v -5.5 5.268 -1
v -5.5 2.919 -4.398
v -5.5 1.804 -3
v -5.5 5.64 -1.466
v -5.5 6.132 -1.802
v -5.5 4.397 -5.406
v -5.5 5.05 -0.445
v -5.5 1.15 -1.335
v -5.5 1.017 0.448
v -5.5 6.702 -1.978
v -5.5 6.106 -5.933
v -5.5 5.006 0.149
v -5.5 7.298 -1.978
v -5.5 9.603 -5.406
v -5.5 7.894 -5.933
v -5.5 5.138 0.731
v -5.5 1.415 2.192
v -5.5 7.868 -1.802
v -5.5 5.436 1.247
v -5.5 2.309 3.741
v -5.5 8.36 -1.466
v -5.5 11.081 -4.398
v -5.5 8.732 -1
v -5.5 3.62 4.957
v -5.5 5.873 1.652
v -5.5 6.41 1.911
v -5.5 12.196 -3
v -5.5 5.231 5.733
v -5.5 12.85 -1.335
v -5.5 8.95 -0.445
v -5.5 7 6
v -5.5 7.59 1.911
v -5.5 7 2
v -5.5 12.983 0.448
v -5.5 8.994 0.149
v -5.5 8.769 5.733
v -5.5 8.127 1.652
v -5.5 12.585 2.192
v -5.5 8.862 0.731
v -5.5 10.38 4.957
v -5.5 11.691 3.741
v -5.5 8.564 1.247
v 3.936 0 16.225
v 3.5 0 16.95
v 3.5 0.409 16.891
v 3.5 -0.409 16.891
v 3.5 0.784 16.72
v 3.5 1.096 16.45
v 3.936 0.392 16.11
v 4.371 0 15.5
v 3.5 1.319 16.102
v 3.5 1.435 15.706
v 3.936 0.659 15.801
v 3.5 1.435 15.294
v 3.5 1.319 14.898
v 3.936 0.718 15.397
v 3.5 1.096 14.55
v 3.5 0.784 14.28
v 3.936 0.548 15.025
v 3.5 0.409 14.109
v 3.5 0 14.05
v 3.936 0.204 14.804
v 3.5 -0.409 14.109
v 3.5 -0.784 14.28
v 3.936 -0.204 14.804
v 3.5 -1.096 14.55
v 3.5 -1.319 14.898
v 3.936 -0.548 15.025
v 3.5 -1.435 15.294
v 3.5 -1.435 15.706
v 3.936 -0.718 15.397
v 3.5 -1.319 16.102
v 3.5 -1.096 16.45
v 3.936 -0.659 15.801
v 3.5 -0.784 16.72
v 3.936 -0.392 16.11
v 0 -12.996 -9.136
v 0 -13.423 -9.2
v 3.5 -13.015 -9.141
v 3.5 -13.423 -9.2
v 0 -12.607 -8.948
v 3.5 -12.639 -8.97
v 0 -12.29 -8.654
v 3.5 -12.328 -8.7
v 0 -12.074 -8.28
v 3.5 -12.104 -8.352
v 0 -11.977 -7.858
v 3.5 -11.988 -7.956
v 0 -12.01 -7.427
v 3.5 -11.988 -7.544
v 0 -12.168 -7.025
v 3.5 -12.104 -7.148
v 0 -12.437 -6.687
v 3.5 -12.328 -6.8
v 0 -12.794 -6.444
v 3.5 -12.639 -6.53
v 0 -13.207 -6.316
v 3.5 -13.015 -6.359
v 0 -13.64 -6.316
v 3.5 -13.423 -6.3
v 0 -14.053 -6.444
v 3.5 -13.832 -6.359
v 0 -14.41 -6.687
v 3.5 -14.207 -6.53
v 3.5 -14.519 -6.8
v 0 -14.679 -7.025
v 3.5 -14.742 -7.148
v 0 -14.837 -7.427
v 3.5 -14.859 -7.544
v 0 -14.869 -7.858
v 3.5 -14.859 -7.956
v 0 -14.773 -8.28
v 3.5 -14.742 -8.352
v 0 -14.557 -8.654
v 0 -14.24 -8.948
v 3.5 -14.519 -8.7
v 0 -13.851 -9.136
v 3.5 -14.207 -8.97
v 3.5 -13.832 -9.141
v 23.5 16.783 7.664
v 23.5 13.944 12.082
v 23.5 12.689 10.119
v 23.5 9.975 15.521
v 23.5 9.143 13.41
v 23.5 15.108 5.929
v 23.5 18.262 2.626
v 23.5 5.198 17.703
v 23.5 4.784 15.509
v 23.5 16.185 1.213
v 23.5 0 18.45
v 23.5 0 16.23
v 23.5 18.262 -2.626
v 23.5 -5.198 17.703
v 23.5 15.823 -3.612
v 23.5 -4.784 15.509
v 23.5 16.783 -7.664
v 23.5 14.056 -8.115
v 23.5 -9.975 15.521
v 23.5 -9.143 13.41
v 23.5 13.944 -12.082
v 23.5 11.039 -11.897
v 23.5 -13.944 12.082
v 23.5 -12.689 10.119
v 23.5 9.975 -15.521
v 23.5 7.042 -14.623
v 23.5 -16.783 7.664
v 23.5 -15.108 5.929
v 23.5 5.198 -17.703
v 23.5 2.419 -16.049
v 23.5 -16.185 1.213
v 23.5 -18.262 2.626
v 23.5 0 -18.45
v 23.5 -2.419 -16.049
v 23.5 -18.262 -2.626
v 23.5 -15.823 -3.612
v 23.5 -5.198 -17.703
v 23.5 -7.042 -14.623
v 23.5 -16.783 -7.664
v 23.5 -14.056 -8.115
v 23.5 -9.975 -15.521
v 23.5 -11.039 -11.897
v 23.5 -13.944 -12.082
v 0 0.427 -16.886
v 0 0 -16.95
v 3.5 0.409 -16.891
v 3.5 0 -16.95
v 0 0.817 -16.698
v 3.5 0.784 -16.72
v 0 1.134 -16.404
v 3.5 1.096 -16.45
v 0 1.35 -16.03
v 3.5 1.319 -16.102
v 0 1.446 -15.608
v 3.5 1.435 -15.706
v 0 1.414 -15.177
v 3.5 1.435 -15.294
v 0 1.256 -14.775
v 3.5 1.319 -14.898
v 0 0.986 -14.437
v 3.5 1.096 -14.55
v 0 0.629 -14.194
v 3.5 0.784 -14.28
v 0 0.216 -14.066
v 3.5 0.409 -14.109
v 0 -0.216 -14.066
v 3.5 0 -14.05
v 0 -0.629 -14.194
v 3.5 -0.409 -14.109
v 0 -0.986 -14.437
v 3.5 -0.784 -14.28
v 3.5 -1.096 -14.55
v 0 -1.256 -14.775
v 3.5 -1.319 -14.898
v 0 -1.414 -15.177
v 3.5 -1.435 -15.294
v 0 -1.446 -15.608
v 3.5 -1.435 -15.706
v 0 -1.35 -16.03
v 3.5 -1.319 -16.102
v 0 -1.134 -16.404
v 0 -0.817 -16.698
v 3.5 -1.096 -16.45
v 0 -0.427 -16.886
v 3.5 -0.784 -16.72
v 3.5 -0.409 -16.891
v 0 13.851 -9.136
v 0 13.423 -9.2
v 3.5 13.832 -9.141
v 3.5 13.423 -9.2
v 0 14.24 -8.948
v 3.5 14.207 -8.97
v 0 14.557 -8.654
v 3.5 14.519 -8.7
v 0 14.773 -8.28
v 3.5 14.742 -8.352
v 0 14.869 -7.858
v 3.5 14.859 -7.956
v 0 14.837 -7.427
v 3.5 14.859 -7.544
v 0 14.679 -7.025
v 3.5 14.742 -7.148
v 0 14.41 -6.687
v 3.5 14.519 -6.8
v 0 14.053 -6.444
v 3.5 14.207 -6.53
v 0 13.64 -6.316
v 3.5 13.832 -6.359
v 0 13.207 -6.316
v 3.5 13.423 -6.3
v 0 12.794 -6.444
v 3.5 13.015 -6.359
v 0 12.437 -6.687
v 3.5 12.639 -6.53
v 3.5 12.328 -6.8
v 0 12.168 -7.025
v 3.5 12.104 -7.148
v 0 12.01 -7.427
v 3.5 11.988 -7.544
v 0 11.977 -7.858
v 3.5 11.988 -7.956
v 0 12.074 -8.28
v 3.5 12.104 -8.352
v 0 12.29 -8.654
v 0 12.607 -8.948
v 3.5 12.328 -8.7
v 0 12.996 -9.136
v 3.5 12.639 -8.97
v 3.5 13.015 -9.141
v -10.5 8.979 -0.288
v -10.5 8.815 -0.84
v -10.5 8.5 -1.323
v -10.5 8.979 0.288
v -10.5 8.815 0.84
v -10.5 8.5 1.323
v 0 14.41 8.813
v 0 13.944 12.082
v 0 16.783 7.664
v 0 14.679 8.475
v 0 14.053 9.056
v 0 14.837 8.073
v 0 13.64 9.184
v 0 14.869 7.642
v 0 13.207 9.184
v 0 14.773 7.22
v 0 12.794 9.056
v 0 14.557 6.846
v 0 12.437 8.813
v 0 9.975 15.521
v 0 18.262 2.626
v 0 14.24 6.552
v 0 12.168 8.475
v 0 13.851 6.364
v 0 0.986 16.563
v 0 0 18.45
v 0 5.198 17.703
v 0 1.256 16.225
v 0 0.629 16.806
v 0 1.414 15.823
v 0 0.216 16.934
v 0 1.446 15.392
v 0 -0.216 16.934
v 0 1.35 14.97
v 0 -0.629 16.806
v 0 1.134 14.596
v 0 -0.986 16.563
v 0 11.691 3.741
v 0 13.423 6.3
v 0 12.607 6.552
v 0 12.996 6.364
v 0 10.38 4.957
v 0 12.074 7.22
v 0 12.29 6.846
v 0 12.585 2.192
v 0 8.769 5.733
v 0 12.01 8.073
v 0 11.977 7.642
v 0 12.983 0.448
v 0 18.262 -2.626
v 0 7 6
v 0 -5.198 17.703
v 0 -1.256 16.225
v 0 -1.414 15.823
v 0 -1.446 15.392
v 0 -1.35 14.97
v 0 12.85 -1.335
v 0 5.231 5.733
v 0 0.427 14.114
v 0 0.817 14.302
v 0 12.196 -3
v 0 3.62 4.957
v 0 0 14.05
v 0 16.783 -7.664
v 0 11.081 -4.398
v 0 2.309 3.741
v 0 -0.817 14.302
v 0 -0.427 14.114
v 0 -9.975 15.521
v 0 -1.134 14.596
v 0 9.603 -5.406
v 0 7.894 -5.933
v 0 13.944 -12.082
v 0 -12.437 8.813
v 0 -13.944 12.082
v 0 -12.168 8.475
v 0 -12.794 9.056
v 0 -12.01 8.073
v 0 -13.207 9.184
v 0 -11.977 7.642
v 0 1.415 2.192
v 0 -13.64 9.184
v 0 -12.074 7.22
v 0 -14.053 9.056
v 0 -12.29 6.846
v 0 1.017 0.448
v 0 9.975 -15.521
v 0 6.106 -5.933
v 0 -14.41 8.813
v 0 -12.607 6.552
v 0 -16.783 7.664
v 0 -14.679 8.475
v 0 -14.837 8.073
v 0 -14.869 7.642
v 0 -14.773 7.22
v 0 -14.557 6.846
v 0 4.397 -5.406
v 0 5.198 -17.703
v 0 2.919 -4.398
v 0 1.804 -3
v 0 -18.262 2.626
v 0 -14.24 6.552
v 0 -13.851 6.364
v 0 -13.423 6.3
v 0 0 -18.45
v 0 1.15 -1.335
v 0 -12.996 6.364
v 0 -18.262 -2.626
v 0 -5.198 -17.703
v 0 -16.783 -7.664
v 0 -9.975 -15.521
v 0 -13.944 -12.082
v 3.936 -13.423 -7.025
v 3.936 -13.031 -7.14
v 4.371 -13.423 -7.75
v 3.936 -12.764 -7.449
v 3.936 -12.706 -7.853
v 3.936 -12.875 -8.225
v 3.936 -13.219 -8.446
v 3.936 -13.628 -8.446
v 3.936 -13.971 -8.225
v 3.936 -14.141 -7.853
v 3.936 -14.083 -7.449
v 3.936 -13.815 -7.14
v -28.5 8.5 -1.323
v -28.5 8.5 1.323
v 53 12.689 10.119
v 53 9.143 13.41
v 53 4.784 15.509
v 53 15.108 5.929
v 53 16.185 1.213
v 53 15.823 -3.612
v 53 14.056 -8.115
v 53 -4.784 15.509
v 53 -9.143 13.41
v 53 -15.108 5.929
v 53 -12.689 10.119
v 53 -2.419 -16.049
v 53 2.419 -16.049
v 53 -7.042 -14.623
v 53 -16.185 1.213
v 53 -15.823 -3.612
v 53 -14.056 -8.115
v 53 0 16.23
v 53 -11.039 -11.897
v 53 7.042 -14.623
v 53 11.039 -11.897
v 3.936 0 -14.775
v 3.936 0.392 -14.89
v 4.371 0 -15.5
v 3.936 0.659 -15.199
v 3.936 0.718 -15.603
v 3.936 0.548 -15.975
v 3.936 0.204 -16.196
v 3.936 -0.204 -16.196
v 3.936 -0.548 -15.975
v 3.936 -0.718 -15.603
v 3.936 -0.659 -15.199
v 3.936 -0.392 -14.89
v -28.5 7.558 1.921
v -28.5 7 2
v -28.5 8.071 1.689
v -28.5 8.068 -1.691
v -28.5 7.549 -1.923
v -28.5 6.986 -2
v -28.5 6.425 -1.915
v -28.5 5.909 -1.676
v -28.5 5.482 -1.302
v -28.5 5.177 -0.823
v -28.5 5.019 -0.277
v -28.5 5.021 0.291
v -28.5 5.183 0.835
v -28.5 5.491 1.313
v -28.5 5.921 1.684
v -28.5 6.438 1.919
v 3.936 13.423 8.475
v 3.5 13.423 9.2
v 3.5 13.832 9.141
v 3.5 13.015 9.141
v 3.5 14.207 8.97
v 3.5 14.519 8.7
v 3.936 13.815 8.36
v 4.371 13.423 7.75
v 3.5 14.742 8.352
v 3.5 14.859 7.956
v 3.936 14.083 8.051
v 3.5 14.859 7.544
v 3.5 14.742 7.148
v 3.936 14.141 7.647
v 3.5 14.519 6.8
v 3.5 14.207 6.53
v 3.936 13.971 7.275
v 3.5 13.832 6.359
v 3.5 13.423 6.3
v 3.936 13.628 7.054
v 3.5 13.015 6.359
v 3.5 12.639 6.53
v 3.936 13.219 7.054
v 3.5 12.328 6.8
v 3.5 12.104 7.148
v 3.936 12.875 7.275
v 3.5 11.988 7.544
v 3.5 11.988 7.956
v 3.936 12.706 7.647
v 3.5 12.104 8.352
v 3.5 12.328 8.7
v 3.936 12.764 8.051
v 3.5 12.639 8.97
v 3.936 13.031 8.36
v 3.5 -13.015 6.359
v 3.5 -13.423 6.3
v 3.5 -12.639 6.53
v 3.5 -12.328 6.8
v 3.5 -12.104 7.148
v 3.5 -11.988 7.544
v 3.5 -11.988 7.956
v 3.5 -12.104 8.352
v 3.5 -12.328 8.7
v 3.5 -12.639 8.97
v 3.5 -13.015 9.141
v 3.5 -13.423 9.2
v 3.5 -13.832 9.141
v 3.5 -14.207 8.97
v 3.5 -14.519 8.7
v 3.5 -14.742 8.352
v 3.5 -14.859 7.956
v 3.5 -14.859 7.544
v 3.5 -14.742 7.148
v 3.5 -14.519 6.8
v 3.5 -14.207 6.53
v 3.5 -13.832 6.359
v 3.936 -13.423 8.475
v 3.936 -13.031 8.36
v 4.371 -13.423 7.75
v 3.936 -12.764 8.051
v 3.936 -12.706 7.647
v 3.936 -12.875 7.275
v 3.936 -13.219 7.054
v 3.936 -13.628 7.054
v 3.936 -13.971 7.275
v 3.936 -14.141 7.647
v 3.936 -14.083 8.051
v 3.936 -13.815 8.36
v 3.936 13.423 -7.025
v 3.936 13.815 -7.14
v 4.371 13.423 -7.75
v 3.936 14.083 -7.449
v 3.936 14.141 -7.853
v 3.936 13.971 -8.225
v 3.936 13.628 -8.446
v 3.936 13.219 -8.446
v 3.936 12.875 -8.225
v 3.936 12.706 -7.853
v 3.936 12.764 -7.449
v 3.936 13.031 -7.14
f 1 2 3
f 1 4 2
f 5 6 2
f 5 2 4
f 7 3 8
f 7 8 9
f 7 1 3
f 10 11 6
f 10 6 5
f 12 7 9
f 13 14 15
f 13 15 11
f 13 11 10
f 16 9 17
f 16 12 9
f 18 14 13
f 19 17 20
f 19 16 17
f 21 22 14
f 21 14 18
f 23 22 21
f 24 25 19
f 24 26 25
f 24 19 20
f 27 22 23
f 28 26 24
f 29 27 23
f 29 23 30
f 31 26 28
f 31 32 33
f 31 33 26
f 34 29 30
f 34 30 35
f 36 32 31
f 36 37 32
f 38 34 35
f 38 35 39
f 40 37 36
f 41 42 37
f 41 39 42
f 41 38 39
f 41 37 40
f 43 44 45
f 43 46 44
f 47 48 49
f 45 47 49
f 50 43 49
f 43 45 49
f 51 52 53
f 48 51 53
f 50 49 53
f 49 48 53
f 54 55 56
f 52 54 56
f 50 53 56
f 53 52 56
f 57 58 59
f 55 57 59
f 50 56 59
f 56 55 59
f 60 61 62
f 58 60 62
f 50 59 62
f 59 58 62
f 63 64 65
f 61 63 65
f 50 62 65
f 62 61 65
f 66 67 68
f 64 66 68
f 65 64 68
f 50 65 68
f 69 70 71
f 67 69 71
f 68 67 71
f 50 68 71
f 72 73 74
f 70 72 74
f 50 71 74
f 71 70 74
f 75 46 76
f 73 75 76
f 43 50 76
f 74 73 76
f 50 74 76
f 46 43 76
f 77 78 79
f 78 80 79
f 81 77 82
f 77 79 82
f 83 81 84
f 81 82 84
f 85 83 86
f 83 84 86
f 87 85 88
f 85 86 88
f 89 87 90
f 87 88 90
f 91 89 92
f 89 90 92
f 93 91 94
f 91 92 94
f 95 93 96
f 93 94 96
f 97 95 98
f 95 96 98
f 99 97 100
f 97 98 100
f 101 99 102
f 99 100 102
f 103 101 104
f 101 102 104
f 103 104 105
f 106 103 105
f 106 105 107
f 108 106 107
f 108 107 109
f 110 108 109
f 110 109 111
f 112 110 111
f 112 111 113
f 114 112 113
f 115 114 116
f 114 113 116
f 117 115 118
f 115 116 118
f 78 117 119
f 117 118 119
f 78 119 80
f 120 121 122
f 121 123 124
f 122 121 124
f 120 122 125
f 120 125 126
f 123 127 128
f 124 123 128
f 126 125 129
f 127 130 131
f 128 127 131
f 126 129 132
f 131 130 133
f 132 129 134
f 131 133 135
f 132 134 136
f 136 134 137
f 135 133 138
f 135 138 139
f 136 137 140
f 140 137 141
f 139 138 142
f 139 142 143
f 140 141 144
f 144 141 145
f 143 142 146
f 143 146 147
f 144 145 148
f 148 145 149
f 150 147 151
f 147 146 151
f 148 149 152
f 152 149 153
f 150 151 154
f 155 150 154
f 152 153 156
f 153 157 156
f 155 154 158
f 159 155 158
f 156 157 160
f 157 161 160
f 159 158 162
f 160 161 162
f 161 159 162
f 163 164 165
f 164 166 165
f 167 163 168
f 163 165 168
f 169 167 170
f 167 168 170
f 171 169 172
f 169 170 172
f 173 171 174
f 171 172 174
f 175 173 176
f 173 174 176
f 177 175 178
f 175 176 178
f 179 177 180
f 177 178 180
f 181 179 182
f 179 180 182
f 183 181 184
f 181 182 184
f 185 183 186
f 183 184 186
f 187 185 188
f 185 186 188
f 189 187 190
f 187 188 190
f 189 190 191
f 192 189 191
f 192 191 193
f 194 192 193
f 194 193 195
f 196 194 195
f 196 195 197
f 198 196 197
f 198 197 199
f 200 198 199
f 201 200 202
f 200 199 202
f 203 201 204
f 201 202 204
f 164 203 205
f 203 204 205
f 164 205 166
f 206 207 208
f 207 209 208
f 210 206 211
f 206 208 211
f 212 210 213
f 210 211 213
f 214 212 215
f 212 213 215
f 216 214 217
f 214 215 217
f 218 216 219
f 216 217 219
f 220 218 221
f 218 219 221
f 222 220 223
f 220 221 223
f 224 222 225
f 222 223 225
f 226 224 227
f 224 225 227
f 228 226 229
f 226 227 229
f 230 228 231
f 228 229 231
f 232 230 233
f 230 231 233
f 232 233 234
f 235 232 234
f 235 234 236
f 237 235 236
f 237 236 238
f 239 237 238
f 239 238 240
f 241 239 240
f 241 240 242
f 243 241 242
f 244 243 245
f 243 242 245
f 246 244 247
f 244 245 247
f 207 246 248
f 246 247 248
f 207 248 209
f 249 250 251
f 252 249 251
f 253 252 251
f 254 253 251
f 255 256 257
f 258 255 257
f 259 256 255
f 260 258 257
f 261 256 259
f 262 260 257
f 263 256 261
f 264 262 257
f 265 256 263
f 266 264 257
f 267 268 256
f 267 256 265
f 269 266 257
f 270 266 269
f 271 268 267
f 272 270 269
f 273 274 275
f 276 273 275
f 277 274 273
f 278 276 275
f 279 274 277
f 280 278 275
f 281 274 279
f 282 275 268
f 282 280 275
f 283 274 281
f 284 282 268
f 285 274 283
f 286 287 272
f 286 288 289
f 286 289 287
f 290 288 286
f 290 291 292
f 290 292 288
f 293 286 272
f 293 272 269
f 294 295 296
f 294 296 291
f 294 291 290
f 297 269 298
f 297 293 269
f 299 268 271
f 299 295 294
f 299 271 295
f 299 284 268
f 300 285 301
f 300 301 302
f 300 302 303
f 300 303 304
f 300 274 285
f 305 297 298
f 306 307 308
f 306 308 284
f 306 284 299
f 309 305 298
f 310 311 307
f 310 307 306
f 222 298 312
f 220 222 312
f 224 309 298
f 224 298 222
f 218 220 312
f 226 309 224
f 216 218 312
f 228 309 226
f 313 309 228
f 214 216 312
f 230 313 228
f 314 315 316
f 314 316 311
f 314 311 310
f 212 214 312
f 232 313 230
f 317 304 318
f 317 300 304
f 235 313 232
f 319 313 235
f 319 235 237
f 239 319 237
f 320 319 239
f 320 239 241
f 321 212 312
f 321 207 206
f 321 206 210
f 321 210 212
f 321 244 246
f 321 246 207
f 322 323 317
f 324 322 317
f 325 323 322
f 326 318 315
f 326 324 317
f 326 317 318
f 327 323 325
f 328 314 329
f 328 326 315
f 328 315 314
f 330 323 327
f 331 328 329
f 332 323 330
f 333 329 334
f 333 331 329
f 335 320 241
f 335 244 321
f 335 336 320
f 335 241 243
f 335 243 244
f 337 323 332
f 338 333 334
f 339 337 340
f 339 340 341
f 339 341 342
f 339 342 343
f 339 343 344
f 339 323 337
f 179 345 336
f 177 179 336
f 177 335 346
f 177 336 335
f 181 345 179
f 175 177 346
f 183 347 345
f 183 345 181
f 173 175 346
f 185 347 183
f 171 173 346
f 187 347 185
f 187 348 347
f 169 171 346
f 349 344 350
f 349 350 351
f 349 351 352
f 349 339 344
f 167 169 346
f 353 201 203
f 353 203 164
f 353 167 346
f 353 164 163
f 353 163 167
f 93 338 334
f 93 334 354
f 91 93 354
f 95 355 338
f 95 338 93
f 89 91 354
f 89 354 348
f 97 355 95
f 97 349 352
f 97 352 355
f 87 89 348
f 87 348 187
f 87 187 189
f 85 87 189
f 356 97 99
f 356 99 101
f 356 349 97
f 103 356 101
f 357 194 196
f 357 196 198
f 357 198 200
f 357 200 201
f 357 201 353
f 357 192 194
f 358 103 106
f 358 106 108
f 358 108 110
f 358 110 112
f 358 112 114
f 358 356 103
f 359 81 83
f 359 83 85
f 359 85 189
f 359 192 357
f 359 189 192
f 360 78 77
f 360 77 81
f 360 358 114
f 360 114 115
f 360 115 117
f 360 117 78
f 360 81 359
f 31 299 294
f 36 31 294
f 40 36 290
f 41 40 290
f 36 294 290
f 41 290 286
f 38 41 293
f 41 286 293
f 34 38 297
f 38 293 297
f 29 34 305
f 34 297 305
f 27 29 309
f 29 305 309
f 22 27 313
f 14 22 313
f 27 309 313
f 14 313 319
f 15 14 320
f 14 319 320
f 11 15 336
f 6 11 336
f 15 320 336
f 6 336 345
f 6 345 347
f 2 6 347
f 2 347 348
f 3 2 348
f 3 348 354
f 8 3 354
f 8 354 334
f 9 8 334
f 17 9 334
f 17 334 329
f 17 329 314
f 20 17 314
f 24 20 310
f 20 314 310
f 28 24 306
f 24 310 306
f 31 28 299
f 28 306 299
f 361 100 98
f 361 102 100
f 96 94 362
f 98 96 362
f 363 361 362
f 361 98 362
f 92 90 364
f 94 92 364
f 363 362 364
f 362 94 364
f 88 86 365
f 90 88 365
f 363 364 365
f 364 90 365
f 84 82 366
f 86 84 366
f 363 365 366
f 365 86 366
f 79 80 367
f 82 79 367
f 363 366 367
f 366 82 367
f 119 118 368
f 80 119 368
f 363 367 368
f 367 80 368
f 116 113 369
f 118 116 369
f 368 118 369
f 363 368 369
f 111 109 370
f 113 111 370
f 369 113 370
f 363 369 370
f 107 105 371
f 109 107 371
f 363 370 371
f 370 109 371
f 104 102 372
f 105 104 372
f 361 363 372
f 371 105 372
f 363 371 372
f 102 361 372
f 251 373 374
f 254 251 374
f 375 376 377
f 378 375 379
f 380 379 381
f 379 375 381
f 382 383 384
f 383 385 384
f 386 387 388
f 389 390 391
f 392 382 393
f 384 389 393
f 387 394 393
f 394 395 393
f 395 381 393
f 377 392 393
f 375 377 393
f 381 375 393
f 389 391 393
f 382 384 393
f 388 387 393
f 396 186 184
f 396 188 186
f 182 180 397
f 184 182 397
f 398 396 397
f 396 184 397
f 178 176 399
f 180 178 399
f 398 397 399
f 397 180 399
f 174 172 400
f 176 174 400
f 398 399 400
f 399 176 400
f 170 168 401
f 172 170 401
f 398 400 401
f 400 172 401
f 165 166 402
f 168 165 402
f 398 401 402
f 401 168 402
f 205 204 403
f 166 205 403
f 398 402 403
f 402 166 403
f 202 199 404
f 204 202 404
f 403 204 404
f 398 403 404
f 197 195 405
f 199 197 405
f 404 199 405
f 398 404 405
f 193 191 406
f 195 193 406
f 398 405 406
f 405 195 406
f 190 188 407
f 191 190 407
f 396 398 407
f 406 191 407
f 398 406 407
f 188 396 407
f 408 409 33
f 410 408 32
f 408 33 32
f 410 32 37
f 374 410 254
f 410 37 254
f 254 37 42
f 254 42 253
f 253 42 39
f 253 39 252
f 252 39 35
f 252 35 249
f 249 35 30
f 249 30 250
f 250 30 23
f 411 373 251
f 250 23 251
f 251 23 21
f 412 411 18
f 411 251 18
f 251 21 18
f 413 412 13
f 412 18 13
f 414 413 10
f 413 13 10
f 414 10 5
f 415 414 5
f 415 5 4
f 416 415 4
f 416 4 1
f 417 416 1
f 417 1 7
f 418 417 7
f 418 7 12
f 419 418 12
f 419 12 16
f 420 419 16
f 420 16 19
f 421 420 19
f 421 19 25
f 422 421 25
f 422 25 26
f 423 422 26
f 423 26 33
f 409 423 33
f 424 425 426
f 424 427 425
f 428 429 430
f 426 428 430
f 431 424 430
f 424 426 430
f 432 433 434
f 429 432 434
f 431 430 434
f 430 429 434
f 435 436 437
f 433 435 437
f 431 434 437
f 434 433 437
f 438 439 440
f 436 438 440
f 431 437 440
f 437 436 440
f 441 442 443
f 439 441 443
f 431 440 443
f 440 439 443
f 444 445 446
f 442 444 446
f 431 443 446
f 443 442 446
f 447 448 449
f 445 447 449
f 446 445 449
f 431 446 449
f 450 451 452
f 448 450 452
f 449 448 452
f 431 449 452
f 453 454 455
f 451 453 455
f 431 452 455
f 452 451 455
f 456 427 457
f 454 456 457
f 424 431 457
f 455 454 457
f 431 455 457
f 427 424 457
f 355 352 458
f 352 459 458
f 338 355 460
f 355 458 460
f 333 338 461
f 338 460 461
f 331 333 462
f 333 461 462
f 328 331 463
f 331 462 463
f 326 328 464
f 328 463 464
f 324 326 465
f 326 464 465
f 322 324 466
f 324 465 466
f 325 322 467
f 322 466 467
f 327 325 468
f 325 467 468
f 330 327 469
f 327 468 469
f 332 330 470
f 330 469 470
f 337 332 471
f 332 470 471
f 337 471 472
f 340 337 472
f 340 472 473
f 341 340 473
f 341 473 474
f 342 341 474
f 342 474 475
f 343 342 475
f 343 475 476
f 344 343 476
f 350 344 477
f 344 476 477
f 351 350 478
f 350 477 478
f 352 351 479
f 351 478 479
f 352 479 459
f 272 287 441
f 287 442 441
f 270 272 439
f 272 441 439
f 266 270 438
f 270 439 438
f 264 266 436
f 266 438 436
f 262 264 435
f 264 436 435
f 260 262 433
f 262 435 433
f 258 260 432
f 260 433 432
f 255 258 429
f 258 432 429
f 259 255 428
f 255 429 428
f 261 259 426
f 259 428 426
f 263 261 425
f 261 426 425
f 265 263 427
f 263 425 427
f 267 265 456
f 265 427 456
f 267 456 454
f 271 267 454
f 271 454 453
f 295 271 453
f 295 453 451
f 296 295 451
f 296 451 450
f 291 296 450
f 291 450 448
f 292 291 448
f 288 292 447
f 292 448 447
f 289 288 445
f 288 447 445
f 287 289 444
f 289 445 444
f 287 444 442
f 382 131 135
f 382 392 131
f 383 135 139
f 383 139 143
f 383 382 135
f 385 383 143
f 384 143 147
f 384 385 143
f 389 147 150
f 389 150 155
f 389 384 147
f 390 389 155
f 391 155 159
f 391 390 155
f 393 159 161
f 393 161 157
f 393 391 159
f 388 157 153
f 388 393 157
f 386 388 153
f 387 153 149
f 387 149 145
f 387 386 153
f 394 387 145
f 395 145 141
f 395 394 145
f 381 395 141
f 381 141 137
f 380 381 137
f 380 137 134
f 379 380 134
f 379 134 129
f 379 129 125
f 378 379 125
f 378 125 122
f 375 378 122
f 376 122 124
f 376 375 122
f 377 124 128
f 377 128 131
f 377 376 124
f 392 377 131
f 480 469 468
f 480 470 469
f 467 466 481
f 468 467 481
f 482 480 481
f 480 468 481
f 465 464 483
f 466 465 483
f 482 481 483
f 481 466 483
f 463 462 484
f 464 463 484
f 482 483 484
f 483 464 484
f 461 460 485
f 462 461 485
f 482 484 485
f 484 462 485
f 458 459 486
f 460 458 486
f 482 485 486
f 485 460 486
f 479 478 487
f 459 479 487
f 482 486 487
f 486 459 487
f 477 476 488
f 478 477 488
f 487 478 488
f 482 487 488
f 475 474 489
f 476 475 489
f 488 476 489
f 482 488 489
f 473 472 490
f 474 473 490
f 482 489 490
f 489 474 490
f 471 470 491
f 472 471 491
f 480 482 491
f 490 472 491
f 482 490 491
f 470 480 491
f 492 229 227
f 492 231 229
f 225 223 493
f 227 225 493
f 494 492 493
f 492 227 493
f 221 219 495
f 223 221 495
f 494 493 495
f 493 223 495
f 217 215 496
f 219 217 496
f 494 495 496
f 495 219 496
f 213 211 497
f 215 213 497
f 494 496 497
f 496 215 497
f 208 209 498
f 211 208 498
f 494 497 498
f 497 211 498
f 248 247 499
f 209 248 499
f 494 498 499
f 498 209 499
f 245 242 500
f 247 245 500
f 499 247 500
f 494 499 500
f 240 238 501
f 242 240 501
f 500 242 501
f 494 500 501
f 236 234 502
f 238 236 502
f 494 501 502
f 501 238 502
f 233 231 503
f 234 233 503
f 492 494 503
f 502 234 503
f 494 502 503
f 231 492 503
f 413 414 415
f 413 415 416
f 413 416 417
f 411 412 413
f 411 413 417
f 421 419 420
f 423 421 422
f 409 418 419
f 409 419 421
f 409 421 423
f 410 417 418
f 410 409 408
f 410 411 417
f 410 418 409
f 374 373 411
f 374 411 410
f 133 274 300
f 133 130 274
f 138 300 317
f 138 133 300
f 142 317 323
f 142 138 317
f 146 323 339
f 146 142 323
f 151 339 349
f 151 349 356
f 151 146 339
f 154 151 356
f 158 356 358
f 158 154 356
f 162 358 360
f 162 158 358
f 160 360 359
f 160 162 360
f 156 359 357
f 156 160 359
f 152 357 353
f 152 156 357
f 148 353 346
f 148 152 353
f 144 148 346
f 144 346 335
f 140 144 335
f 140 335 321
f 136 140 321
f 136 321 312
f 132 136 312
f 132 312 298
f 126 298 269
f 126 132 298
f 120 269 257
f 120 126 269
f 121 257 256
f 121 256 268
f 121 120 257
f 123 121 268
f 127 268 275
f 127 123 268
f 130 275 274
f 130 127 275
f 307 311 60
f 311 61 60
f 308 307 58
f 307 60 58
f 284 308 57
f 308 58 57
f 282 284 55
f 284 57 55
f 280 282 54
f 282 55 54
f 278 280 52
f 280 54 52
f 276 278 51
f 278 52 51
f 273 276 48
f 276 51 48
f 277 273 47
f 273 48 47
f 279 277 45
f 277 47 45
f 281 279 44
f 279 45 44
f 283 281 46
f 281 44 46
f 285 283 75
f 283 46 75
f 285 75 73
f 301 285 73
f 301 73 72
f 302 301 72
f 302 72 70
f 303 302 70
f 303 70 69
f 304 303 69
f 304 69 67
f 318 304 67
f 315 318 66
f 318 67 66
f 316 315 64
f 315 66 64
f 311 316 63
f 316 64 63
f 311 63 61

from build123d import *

# Parameters (mm, degrees)
SKETCH1_W                   = 23.5
SKETCH1_H                   = 18.45
SKETCH1_W_2                 = 29.5
SKETCH1_H_2                 = 16.23
M3_5X0_6_TAPPED_HOLE1_D     = 2.9
M3_5X0_6_TAPPED_HOLE1_DEPTH = 3.5
M3_5X0_6_TAPPED_HOLE1_TIP   = 0.871247898
SKETCH6_R                   = 6
BOSS_EXTRUDE1_DEPTH         = 5.5
SKETCH7_R                   = 2
BOSS_EXTRUDE2_DEPTH         = 23
CUT_EXTRUDE1_DEPTH          = 18


with BuildPart() as part:
    # Sketch1 → Revolve1 (revolve)
    with BuildSketch(Plane.XY, mode=Mode.PRIVATE) as revolve1_sk:
        with Locations((11.75, 9.225)):
            Rectangle(SKETCH1_W, SKETCH1_H)
        with Locations((38.25, 8.115)):
            Rectangle(SKETCH1_W_2, SKETCH1_H_2)
    revolve(revolve1_sk.sketch.rotate(Axis((0, 0, 0), (1, 0, 0)), 90), axis=Axis((0, 0, 0), (1, 0, 0)))

    # M3.5x0.6 Tapped Hole1
    with Locations(Plane.ZY):
        with Locations((7.75, 13.423393759), (15.5, 0), (7.75, -13.423393759), (-7.75, -13.423393759), (-15.5, 0), (-7.75, 13.423393759)):
            Hole(M3_5X0_6_TAPPED_HOLE1_D / 2, depth=M3_5X0_6_TAPPED_HOLE1_DEPTH)
            with Locations((0, 0, -(M3_5X0_6_TAPPED_HOLE1_DEPTH + M3_5X0_6_TAPPED_HOLE1_TIP / 2))):  # 118° drill point
                Cone(0, M3_5X0_6_TAPPED_HOLE1_D / 2, M3_5X0_6_TAPPED_HOLE1_TIP, mode=Mode.SUBTRACT)

    # Sketch6 → Boss-Extrude1 (add)
    with BuildSketch(Plane.ZY):
        with Locations((0, 7)):
            Circle(SKETCH6_R)
    extrude(amount=BOSS_EXTRUDE1_DEPTH)

    # Sketch7 → Boss-Extrude2 (add)
    with BuildSketch(Plane.ZY.offset(5.5)):
        with Locations((0, 7)):
            Circle(SKETCH7_R)
    extrude(amount=BOSS_EXTRUDE2_DEPTH)

    # Sketch8 → Cut-Extrude1 (cut)
    with BuildSketch(Plane.ZY.offset(28.5)):
        Polygon((-78.17402708, 8.5), (-1.322875656, 8.5), (1.322875656, 8.5), (78.17402708, 8.5), (78.17402708, 162.202302849), (-78.17402708, 162.202302849), align=None)
    extrude(amount=-CUT_EXTRUDE1_DEPTH, mode=Mode.SUBTRACT)


solid = part.part
